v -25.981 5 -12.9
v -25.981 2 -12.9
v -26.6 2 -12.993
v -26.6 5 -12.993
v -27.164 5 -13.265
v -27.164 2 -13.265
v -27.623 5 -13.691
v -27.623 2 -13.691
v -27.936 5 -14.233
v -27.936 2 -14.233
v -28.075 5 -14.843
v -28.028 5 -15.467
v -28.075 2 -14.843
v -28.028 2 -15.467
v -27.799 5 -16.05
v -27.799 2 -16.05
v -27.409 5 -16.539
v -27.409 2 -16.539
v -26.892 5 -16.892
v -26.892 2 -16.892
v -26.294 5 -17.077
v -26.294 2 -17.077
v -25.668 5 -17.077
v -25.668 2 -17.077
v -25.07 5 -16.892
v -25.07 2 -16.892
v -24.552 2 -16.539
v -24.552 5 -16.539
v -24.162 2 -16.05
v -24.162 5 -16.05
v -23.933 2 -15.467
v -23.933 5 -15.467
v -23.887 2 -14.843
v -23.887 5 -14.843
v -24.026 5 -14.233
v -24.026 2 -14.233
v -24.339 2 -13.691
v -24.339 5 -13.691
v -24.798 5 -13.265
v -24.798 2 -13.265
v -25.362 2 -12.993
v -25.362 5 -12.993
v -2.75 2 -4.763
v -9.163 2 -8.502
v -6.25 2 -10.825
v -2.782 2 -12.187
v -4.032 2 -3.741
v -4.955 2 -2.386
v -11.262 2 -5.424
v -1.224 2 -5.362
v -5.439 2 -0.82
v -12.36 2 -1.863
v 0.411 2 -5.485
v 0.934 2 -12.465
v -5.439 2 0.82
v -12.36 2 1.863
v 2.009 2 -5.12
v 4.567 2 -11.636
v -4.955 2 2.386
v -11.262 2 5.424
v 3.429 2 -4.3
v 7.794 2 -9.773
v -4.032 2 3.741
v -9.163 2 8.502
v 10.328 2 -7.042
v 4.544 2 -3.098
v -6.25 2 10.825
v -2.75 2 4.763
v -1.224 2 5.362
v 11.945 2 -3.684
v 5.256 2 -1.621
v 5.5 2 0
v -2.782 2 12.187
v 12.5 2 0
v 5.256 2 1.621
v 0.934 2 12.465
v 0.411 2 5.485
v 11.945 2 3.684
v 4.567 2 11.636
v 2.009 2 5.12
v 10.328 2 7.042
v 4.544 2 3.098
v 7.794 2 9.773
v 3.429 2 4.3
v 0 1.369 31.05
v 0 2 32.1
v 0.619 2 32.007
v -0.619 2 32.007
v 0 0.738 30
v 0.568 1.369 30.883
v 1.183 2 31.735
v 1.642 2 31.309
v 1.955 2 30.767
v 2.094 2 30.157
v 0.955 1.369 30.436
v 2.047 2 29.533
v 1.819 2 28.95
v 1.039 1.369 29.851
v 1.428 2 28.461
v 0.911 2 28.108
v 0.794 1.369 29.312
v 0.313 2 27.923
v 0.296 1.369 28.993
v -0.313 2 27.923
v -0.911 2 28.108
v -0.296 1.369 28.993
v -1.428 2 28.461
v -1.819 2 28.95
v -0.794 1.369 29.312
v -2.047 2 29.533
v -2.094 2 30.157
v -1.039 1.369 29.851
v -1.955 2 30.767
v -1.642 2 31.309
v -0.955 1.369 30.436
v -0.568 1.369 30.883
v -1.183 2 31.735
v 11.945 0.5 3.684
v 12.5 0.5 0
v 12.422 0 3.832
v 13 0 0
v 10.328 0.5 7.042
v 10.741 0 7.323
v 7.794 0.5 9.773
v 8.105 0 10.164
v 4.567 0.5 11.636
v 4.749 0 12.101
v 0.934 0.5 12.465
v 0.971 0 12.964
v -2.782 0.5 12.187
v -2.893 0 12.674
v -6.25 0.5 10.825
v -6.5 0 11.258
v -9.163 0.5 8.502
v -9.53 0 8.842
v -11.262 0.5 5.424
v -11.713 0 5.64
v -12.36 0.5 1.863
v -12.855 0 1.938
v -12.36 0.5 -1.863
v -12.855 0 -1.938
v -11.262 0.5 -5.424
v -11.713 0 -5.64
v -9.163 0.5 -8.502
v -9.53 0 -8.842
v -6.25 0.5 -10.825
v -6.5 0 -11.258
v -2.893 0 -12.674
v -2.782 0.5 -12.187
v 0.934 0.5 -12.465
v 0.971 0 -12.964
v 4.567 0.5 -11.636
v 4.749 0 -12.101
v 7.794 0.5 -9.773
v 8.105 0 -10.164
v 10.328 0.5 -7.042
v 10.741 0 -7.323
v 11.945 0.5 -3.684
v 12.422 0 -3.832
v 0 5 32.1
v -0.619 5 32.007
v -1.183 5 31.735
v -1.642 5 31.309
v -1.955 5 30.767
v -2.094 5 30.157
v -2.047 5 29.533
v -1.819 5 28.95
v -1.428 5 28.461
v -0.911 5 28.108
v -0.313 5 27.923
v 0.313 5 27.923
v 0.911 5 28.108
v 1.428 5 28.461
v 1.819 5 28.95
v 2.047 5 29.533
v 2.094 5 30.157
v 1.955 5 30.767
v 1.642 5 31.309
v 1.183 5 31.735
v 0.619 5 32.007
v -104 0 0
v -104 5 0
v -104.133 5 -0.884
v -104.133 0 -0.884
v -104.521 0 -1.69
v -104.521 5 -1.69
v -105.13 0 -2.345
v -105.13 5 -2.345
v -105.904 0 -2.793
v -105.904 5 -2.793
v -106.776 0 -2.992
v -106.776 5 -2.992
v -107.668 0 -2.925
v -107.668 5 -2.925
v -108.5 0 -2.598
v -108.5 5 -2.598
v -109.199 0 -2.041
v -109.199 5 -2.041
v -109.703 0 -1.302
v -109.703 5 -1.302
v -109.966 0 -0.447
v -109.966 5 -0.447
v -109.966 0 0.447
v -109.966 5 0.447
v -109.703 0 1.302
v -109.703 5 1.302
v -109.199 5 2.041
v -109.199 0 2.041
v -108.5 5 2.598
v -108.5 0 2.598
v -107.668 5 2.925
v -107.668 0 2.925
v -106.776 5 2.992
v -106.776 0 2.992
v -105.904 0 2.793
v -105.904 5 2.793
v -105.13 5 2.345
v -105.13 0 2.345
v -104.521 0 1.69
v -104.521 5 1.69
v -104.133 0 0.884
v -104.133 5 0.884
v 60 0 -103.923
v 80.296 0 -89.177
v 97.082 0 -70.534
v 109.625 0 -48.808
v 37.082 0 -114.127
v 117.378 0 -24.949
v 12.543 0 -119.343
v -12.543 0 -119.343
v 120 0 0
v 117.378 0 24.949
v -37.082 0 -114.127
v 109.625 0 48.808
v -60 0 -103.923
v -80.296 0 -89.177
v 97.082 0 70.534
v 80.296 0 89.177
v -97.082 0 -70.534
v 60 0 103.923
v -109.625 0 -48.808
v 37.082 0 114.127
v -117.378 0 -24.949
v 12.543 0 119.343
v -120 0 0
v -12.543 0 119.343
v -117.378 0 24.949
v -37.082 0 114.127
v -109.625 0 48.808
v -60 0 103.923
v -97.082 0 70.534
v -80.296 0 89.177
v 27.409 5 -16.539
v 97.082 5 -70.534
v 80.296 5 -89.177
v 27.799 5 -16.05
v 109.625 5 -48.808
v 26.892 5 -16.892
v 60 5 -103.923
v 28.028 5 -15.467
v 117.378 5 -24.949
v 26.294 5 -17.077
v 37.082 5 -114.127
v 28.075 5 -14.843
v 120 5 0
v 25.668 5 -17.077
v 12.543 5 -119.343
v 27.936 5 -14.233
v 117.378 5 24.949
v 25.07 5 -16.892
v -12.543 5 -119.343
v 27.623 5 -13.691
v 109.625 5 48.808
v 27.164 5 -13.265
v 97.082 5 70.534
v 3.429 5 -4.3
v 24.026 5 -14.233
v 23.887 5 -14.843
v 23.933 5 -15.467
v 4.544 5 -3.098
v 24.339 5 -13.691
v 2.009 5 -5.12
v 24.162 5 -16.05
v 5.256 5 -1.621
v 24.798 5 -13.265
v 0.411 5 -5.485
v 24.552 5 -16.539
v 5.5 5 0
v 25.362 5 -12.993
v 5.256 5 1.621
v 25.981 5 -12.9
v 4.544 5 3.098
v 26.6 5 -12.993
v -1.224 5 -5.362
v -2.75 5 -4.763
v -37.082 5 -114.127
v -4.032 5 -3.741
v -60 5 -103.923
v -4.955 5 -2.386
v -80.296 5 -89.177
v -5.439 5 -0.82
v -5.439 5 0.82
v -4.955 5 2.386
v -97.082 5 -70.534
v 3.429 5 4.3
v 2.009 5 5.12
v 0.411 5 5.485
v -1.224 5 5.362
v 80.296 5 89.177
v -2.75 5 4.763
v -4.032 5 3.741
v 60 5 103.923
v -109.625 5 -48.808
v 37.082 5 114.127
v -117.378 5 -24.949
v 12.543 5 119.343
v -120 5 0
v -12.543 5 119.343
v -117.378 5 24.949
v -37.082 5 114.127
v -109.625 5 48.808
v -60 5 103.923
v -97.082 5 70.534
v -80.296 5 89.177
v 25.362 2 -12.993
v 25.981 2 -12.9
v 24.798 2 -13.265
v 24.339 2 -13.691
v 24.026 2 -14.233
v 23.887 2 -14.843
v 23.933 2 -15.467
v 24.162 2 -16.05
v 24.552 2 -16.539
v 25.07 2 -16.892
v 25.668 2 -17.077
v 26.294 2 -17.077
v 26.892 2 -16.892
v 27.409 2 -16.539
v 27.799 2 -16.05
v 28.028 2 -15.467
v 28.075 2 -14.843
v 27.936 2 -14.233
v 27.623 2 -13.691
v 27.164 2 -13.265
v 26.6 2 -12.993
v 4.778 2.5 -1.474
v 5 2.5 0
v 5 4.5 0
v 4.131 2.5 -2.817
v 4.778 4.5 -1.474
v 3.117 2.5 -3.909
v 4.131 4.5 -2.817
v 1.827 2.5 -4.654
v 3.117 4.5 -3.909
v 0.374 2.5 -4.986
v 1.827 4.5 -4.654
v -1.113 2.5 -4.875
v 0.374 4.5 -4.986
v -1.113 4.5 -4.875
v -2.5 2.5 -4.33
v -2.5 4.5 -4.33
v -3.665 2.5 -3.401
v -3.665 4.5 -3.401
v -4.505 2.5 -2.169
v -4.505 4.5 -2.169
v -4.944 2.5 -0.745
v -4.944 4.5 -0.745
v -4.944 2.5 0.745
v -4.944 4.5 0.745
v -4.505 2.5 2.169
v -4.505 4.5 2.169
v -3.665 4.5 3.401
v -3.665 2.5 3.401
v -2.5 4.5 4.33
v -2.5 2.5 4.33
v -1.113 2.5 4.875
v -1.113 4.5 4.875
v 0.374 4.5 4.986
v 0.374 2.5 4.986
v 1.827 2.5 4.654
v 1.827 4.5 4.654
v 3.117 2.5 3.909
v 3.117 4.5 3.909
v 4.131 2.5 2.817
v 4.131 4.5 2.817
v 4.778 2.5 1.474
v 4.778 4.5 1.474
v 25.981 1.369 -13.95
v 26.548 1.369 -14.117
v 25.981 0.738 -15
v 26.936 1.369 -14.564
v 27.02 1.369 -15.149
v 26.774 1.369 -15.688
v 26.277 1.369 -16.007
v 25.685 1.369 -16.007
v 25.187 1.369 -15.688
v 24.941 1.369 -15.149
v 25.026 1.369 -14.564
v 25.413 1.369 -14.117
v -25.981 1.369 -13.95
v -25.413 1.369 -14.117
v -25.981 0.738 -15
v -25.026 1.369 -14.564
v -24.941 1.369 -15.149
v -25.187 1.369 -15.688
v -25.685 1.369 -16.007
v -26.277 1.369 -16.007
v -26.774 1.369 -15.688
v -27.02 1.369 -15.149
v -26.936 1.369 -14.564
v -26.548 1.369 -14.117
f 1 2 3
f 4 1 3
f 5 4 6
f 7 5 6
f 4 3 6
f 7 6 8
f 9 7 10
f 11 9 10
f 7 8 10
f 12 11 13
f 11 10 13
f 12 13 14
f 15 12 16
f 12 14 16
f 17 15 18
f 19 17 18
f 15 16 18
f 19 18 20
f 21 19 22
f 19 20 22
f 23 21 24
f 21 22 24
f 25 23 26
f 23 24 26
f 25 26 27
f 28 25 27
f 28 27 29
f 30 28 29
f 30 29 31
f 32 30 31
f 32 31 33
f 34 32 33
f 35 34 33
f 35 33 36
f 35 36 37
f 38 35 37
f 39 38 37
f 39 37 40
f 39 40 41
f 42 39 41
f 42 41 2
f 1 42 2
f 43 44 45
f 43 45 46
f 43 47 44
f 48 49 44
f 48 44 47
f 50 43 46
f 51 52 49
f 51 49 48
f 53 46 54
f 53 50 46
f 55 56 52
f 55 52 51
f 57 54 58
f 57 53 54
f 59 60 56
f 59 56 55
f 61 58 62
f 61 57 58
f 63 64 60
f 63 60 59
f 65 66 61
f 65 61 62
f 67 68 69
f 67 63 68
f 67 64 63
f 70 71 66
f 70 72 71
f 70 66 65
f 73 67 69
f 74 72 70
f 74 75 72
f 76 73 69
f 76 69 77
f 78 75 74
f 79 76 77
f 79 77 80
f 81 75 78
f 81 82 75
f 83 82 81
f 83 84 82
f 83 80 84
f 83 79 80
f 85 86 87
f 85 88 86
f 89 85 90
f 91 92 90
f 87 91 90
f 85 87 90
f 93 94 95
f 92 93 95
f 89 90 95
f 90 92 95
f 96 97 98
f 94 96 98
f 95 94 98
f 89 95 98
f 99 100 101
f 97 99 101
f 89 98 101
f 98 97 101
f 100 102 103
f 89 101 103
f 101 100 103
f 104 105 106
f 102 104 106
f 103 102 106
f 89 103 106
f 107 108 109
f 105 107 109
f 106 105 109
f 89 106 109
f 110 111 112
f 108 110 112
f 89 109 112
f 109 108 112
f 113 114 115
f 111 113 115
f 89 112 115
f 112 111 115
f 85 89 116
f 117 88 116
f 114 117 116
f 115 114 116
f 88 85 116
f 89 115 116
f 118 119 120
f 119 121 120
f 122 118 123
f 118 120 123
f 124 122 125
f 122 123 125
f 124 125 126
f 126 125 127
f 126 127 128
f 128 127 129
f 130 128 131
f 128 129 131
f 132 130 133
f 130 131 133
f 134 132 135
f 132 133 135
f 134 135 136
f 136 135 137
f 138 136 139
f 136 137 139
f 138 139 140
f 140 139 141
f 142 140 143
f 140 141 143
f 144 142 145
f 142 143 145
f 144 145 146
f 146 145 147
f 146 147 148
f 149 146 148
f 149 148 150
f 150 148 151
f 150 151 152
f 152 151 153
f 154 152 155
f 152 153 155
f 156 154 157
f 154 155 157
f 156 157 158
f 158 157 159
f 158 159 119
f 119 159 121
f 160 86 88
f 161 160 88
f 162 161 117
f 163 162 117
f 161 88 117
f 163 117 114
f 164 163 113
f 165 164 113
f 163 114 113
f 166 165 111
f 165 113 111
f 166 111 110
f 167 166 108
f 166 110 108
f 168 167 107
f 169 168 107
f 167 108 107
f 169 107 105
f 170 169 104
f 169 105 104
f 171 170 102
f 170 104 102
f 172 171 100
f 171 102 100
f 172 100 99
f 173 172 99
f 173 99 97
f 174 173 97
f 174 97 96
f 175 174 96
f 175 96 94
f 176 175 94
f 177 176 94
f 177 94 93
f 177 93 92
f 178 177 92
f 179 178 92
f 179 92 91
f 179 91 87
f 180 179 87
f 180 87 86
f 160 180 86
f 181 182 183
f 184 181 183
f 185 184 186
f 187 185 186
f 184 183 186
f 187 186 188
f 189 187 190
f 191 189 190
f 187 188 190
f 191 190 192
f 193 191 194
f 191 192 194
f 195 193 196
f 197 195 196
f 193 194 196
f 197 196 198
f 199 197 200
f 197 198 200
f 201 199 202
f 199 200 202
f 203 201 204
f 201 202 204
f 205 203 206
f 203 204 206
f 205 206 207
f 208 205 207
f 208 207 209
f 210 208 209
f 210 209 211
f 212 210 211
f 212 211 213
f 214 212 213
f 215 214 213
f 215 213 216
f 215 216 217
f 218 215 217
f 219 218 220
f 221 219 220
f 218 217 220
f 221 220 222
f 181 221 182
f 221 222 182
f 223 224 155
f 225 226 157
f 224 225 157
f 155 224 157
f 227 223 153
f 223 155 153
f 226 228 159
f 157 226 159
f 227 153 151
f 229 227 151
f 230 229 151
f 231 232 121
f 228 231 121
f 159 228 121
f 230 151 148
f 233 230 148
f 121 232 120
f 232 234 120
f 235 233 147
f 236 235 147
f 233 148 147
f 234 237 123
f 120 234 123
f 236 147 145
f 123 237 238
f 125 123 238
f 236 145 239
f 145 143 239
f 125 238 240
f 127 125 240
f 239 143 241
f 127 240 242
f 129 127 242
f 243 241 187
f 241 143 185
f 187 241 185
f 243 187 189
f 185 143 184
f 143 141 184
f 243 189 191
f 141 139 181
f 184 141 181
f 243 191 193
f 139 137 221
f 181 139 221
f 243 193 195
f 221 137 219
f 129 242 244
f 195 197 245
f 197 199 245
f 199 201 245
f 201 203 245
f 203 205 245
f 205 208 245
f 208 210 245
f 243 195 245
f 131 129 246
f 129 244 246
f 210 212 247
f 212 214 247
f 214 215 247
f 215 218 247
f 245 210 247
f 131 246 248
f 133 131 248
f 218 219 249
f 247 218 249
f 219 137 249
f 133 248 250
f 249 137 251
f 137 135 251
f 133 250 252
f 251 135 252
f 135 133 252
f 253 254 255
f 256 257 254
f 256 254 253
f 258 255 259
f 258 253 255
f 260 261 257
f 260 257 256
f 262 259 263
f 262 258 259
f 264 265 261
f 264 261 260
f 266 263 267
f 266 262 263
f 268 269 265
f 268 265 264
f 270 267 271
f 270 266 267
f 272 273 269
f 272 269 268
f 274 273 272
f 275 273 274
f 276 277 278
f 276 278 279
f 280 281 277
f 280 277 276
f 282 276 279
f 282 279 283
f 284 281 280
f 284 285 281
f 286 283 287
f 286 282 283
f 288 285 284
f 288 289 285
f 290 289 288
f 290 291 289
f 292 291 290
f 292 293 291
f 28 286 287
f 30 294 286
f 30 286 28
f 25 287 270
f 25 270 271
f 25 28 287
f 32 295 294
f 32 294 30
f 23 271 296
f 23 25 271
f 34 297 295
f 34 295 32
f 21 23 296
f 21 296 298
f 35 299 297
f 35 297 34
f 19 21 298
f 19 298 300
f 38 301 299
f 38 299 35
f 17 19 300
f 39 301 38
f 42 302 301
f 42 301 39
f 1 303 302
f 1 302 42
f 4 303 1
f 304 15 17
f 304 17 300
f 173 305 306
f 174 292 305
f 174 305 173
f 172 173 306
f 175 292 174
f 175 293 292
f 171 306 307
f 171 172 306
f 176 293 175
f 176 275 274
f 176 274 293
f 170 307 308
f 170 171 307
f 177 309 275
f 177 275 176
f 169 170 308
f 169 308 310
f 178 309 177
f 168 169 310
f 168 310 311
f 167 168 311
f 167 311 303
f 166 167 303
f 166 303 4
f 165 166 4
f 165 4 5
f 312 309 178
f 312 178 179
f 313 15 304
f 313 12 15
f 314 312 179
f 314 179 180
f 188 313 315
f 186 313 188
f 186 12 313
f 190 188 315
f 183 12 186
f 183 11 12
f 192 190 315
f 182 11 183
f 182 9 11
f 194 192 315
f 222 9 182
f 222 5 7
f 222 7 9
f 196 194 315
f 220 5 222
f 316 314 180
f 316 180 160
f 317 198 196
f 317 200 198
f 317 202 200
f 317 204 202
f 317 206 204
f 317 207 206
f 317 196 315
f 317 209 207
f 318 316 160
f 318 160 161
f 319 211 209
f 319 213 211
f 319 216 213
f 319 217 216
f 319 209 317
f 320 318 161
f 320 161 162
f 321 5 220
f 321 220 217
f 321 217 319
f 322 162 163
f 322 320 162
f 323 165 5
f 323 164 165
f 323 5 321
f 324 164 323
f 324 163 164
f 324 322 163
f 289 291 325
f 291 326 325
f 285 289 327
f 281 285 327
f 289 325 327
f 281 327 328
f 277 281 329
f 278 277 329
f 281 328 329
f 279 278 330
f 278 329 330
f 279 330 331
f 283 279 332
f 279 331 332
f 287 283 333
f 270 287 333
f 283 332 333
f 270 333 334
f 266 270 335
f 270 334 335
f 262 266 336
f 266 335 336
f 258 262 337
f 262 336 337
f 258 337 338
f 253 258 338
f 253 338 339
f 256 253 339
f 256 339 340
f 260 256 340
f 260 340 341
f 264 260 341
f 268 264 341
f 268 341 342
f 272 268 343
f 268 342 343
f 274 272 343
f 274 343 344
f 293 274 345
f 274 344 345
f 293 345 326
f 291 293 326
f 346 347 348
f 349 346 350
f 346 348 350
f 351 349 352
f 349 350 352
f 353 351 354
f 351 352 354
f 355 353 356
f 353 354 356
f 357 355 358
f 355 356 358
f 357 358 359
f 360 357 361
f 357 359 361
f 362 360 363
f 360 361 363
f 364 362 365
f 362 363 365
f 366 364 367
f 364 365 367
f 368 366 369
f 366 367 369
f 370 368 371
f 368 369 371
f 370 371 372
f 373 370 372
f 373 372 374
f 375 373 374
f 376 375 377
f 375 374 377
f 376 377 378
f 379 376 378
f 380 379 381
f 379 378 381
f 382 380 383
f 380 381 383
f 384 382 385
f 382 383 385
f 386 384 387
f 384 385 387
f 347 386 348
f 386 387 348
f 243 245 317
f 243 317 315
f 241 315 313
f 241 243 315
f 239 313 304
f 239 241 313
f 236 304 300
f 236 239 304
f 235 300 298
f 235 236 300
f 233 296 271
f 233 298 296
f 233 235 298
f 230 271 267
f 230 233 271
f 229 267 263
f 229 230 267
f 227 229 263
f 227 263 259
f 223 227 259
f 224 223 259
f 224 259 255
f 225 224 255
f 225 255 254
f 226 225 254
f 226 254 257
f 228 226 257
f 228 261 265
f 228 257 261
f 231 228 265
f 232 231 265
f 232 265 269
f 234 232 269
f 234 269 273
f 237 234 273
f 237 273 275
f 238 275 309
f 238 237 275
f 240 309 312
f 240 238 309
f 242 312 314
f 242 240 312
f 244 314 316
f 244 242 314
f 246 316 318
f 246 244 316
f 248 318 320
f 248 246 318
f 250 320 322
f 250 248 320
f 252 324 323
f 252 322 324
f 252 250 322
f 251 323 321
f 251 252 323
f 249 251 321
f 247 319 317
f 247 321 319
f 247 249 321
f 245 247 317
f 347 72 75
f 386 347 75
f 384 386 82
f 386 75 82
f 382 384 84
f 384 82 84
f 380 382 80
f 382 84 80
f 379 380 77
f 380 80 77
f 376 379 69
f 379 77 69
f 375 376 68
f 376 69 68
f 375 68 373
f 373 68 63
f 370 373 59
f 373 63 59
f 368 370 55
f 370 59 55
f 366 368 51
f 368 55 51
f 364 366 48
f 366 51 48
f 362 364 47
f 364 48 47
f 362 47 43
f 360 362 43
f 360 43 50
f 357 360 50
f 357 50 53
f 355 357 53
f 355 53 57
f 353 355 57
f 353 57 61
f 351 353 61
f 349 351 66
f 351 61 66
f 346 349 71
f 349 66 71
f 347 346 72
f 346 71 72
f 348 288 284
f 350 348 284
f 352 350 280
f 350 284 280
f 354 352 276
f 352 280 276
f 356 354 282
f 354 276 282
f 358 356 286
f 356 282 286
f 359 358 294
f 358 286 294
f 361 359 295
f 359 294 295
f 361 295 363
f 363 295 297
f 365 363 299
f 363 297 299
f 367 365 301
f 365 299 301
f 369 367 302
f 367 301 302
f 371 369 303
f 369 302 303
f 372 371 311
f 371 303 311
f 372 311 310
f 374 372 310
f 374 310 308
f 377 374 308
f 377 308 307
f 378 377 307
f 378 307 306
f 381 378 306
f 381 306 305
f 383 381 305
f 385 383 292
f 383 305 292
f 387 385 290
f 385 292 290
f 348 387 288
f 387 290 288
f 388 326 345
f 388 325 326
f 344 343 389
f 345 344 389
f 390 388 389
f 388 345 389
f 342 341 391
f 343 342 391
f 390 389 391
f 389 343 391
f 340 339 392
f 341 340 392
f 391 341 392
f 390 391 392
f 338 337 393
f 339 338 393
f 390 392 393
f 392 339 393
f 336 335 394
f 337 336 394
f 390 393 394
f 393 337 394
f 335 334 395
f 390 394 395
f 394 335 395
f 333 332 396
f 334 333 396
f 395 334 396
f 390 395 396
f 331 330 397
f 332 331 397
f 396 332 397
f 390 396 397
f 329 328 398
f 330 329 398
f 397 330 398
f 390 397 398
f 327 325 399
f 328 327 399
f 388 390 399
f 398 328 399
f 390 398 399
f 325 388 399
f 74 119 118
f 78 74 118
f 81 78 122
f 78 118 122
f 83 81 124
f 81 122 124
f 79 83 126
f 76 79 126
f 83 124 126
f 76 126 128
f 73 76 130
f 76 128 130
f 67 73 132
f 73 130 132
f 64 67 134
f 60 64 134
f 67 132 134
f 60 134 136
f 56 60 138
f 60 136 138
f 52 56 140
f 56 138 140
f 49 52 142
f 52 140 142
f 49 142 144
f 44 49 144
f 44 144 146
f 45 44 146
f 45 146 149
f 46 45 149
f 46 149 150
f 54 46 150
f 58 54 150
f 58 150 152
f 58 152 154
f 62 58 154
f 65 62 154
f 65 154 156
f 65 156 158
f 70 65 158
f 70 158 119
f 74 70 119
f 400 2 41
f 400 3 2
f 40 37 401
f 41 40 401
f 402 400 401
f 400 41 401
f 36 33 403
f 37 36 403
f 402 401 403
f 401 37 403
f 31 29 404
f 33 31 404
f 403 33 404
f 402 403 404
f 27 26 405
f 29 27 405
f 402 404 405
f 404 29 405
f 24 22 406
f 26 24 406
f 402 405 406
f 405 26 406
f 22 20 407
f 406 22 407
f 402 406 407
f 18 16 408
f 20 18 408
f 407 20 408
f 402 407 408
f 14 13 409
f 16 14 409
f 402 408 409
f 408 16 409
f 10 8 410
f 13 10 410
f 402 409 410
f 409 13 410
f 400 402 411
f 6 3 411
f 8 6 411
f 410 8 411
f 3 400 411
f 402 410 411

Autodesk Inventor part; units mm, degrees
ref_plane "YZ Plane" through (0, 0, 0) normal (1, 0, 0) x (0, 1, 0)
ref_plane "XZ Plane" through (0, 0, 0) normal (0, 1, 0) x (-1, 0, 0)
ref_plane "XY Plane" through (0, 0, 0) normal (0, 0, 1) x (1, 0, 0)
sketch "Esquisse1" plane through (0, 0, 0) normal (0, 1, 0) x (-1, 0, 0)
  circle A0 centre (0, 0) radius 5 construction
  circle A1 centre (0, 0) radius 120
  dimension "d0" = 10
  dimension "d39" = 240
extrude "Extrusion1" add sketch "Esquisse1" along normal blind 5
sketch "Esquisse2" plane through (0, 5, 0) normal (0, 1, 0) x (1, 0, 0)
  circle A0 centre (0, 0) radius 5
  dimension "d5" = 10
extrude "Extrusion2" cut sketch "Esquisse2" against normal up to surface (5 mm away)
sketch "Esquisse3" plane through (0, 0, 0) normal (0, -1, 0) x (1, 0, 0)
  circle A0 centre (0, 0) radius 5 projected
  circle A1 centre (0, 0) radius 12.5
  dimension "d8" = 25
extrude "Extrusion3" cut sketch "Esquisse3" against normal blind 2
chamfer "Chanfrein1" distance 0.5 angle 45 3 edges at (-12.5, 0, 0) (-5, 2, 0) (-5, 5, 0)
sketch "Esquisse4" plane through (0, 5, 0) normal (0, 1, 0) x (1, 0, 0)
  point P0 (0, 0)
  point P1 (0, -30)
  point P2 (25.9808, 15)
  point P3 (-25.9808, 15)
  dimension "d14" = 30
  dimension "d17" = 360
hole "Perçage1" at (0, 5, 30) at (25.9808, 5, -15) at (-25.9808, 5, -15) direction (0, -1, 0) diameter 4.2 depth 3 tip angle 118
sketch "Esquisse6" plane through (0, 5, 0) normal (0, 1, 0) x (1, 0, 0)
  circle A0 centre (-107, 0) radius 3
  point P0 (0, 0)
  dimension "d42" = 6
  dimension "d43" = 107
extrude "Extrusion5" cut sketch "Esquisse6" against normal up to surface (5 mm away)
properties part number "tourelle"
